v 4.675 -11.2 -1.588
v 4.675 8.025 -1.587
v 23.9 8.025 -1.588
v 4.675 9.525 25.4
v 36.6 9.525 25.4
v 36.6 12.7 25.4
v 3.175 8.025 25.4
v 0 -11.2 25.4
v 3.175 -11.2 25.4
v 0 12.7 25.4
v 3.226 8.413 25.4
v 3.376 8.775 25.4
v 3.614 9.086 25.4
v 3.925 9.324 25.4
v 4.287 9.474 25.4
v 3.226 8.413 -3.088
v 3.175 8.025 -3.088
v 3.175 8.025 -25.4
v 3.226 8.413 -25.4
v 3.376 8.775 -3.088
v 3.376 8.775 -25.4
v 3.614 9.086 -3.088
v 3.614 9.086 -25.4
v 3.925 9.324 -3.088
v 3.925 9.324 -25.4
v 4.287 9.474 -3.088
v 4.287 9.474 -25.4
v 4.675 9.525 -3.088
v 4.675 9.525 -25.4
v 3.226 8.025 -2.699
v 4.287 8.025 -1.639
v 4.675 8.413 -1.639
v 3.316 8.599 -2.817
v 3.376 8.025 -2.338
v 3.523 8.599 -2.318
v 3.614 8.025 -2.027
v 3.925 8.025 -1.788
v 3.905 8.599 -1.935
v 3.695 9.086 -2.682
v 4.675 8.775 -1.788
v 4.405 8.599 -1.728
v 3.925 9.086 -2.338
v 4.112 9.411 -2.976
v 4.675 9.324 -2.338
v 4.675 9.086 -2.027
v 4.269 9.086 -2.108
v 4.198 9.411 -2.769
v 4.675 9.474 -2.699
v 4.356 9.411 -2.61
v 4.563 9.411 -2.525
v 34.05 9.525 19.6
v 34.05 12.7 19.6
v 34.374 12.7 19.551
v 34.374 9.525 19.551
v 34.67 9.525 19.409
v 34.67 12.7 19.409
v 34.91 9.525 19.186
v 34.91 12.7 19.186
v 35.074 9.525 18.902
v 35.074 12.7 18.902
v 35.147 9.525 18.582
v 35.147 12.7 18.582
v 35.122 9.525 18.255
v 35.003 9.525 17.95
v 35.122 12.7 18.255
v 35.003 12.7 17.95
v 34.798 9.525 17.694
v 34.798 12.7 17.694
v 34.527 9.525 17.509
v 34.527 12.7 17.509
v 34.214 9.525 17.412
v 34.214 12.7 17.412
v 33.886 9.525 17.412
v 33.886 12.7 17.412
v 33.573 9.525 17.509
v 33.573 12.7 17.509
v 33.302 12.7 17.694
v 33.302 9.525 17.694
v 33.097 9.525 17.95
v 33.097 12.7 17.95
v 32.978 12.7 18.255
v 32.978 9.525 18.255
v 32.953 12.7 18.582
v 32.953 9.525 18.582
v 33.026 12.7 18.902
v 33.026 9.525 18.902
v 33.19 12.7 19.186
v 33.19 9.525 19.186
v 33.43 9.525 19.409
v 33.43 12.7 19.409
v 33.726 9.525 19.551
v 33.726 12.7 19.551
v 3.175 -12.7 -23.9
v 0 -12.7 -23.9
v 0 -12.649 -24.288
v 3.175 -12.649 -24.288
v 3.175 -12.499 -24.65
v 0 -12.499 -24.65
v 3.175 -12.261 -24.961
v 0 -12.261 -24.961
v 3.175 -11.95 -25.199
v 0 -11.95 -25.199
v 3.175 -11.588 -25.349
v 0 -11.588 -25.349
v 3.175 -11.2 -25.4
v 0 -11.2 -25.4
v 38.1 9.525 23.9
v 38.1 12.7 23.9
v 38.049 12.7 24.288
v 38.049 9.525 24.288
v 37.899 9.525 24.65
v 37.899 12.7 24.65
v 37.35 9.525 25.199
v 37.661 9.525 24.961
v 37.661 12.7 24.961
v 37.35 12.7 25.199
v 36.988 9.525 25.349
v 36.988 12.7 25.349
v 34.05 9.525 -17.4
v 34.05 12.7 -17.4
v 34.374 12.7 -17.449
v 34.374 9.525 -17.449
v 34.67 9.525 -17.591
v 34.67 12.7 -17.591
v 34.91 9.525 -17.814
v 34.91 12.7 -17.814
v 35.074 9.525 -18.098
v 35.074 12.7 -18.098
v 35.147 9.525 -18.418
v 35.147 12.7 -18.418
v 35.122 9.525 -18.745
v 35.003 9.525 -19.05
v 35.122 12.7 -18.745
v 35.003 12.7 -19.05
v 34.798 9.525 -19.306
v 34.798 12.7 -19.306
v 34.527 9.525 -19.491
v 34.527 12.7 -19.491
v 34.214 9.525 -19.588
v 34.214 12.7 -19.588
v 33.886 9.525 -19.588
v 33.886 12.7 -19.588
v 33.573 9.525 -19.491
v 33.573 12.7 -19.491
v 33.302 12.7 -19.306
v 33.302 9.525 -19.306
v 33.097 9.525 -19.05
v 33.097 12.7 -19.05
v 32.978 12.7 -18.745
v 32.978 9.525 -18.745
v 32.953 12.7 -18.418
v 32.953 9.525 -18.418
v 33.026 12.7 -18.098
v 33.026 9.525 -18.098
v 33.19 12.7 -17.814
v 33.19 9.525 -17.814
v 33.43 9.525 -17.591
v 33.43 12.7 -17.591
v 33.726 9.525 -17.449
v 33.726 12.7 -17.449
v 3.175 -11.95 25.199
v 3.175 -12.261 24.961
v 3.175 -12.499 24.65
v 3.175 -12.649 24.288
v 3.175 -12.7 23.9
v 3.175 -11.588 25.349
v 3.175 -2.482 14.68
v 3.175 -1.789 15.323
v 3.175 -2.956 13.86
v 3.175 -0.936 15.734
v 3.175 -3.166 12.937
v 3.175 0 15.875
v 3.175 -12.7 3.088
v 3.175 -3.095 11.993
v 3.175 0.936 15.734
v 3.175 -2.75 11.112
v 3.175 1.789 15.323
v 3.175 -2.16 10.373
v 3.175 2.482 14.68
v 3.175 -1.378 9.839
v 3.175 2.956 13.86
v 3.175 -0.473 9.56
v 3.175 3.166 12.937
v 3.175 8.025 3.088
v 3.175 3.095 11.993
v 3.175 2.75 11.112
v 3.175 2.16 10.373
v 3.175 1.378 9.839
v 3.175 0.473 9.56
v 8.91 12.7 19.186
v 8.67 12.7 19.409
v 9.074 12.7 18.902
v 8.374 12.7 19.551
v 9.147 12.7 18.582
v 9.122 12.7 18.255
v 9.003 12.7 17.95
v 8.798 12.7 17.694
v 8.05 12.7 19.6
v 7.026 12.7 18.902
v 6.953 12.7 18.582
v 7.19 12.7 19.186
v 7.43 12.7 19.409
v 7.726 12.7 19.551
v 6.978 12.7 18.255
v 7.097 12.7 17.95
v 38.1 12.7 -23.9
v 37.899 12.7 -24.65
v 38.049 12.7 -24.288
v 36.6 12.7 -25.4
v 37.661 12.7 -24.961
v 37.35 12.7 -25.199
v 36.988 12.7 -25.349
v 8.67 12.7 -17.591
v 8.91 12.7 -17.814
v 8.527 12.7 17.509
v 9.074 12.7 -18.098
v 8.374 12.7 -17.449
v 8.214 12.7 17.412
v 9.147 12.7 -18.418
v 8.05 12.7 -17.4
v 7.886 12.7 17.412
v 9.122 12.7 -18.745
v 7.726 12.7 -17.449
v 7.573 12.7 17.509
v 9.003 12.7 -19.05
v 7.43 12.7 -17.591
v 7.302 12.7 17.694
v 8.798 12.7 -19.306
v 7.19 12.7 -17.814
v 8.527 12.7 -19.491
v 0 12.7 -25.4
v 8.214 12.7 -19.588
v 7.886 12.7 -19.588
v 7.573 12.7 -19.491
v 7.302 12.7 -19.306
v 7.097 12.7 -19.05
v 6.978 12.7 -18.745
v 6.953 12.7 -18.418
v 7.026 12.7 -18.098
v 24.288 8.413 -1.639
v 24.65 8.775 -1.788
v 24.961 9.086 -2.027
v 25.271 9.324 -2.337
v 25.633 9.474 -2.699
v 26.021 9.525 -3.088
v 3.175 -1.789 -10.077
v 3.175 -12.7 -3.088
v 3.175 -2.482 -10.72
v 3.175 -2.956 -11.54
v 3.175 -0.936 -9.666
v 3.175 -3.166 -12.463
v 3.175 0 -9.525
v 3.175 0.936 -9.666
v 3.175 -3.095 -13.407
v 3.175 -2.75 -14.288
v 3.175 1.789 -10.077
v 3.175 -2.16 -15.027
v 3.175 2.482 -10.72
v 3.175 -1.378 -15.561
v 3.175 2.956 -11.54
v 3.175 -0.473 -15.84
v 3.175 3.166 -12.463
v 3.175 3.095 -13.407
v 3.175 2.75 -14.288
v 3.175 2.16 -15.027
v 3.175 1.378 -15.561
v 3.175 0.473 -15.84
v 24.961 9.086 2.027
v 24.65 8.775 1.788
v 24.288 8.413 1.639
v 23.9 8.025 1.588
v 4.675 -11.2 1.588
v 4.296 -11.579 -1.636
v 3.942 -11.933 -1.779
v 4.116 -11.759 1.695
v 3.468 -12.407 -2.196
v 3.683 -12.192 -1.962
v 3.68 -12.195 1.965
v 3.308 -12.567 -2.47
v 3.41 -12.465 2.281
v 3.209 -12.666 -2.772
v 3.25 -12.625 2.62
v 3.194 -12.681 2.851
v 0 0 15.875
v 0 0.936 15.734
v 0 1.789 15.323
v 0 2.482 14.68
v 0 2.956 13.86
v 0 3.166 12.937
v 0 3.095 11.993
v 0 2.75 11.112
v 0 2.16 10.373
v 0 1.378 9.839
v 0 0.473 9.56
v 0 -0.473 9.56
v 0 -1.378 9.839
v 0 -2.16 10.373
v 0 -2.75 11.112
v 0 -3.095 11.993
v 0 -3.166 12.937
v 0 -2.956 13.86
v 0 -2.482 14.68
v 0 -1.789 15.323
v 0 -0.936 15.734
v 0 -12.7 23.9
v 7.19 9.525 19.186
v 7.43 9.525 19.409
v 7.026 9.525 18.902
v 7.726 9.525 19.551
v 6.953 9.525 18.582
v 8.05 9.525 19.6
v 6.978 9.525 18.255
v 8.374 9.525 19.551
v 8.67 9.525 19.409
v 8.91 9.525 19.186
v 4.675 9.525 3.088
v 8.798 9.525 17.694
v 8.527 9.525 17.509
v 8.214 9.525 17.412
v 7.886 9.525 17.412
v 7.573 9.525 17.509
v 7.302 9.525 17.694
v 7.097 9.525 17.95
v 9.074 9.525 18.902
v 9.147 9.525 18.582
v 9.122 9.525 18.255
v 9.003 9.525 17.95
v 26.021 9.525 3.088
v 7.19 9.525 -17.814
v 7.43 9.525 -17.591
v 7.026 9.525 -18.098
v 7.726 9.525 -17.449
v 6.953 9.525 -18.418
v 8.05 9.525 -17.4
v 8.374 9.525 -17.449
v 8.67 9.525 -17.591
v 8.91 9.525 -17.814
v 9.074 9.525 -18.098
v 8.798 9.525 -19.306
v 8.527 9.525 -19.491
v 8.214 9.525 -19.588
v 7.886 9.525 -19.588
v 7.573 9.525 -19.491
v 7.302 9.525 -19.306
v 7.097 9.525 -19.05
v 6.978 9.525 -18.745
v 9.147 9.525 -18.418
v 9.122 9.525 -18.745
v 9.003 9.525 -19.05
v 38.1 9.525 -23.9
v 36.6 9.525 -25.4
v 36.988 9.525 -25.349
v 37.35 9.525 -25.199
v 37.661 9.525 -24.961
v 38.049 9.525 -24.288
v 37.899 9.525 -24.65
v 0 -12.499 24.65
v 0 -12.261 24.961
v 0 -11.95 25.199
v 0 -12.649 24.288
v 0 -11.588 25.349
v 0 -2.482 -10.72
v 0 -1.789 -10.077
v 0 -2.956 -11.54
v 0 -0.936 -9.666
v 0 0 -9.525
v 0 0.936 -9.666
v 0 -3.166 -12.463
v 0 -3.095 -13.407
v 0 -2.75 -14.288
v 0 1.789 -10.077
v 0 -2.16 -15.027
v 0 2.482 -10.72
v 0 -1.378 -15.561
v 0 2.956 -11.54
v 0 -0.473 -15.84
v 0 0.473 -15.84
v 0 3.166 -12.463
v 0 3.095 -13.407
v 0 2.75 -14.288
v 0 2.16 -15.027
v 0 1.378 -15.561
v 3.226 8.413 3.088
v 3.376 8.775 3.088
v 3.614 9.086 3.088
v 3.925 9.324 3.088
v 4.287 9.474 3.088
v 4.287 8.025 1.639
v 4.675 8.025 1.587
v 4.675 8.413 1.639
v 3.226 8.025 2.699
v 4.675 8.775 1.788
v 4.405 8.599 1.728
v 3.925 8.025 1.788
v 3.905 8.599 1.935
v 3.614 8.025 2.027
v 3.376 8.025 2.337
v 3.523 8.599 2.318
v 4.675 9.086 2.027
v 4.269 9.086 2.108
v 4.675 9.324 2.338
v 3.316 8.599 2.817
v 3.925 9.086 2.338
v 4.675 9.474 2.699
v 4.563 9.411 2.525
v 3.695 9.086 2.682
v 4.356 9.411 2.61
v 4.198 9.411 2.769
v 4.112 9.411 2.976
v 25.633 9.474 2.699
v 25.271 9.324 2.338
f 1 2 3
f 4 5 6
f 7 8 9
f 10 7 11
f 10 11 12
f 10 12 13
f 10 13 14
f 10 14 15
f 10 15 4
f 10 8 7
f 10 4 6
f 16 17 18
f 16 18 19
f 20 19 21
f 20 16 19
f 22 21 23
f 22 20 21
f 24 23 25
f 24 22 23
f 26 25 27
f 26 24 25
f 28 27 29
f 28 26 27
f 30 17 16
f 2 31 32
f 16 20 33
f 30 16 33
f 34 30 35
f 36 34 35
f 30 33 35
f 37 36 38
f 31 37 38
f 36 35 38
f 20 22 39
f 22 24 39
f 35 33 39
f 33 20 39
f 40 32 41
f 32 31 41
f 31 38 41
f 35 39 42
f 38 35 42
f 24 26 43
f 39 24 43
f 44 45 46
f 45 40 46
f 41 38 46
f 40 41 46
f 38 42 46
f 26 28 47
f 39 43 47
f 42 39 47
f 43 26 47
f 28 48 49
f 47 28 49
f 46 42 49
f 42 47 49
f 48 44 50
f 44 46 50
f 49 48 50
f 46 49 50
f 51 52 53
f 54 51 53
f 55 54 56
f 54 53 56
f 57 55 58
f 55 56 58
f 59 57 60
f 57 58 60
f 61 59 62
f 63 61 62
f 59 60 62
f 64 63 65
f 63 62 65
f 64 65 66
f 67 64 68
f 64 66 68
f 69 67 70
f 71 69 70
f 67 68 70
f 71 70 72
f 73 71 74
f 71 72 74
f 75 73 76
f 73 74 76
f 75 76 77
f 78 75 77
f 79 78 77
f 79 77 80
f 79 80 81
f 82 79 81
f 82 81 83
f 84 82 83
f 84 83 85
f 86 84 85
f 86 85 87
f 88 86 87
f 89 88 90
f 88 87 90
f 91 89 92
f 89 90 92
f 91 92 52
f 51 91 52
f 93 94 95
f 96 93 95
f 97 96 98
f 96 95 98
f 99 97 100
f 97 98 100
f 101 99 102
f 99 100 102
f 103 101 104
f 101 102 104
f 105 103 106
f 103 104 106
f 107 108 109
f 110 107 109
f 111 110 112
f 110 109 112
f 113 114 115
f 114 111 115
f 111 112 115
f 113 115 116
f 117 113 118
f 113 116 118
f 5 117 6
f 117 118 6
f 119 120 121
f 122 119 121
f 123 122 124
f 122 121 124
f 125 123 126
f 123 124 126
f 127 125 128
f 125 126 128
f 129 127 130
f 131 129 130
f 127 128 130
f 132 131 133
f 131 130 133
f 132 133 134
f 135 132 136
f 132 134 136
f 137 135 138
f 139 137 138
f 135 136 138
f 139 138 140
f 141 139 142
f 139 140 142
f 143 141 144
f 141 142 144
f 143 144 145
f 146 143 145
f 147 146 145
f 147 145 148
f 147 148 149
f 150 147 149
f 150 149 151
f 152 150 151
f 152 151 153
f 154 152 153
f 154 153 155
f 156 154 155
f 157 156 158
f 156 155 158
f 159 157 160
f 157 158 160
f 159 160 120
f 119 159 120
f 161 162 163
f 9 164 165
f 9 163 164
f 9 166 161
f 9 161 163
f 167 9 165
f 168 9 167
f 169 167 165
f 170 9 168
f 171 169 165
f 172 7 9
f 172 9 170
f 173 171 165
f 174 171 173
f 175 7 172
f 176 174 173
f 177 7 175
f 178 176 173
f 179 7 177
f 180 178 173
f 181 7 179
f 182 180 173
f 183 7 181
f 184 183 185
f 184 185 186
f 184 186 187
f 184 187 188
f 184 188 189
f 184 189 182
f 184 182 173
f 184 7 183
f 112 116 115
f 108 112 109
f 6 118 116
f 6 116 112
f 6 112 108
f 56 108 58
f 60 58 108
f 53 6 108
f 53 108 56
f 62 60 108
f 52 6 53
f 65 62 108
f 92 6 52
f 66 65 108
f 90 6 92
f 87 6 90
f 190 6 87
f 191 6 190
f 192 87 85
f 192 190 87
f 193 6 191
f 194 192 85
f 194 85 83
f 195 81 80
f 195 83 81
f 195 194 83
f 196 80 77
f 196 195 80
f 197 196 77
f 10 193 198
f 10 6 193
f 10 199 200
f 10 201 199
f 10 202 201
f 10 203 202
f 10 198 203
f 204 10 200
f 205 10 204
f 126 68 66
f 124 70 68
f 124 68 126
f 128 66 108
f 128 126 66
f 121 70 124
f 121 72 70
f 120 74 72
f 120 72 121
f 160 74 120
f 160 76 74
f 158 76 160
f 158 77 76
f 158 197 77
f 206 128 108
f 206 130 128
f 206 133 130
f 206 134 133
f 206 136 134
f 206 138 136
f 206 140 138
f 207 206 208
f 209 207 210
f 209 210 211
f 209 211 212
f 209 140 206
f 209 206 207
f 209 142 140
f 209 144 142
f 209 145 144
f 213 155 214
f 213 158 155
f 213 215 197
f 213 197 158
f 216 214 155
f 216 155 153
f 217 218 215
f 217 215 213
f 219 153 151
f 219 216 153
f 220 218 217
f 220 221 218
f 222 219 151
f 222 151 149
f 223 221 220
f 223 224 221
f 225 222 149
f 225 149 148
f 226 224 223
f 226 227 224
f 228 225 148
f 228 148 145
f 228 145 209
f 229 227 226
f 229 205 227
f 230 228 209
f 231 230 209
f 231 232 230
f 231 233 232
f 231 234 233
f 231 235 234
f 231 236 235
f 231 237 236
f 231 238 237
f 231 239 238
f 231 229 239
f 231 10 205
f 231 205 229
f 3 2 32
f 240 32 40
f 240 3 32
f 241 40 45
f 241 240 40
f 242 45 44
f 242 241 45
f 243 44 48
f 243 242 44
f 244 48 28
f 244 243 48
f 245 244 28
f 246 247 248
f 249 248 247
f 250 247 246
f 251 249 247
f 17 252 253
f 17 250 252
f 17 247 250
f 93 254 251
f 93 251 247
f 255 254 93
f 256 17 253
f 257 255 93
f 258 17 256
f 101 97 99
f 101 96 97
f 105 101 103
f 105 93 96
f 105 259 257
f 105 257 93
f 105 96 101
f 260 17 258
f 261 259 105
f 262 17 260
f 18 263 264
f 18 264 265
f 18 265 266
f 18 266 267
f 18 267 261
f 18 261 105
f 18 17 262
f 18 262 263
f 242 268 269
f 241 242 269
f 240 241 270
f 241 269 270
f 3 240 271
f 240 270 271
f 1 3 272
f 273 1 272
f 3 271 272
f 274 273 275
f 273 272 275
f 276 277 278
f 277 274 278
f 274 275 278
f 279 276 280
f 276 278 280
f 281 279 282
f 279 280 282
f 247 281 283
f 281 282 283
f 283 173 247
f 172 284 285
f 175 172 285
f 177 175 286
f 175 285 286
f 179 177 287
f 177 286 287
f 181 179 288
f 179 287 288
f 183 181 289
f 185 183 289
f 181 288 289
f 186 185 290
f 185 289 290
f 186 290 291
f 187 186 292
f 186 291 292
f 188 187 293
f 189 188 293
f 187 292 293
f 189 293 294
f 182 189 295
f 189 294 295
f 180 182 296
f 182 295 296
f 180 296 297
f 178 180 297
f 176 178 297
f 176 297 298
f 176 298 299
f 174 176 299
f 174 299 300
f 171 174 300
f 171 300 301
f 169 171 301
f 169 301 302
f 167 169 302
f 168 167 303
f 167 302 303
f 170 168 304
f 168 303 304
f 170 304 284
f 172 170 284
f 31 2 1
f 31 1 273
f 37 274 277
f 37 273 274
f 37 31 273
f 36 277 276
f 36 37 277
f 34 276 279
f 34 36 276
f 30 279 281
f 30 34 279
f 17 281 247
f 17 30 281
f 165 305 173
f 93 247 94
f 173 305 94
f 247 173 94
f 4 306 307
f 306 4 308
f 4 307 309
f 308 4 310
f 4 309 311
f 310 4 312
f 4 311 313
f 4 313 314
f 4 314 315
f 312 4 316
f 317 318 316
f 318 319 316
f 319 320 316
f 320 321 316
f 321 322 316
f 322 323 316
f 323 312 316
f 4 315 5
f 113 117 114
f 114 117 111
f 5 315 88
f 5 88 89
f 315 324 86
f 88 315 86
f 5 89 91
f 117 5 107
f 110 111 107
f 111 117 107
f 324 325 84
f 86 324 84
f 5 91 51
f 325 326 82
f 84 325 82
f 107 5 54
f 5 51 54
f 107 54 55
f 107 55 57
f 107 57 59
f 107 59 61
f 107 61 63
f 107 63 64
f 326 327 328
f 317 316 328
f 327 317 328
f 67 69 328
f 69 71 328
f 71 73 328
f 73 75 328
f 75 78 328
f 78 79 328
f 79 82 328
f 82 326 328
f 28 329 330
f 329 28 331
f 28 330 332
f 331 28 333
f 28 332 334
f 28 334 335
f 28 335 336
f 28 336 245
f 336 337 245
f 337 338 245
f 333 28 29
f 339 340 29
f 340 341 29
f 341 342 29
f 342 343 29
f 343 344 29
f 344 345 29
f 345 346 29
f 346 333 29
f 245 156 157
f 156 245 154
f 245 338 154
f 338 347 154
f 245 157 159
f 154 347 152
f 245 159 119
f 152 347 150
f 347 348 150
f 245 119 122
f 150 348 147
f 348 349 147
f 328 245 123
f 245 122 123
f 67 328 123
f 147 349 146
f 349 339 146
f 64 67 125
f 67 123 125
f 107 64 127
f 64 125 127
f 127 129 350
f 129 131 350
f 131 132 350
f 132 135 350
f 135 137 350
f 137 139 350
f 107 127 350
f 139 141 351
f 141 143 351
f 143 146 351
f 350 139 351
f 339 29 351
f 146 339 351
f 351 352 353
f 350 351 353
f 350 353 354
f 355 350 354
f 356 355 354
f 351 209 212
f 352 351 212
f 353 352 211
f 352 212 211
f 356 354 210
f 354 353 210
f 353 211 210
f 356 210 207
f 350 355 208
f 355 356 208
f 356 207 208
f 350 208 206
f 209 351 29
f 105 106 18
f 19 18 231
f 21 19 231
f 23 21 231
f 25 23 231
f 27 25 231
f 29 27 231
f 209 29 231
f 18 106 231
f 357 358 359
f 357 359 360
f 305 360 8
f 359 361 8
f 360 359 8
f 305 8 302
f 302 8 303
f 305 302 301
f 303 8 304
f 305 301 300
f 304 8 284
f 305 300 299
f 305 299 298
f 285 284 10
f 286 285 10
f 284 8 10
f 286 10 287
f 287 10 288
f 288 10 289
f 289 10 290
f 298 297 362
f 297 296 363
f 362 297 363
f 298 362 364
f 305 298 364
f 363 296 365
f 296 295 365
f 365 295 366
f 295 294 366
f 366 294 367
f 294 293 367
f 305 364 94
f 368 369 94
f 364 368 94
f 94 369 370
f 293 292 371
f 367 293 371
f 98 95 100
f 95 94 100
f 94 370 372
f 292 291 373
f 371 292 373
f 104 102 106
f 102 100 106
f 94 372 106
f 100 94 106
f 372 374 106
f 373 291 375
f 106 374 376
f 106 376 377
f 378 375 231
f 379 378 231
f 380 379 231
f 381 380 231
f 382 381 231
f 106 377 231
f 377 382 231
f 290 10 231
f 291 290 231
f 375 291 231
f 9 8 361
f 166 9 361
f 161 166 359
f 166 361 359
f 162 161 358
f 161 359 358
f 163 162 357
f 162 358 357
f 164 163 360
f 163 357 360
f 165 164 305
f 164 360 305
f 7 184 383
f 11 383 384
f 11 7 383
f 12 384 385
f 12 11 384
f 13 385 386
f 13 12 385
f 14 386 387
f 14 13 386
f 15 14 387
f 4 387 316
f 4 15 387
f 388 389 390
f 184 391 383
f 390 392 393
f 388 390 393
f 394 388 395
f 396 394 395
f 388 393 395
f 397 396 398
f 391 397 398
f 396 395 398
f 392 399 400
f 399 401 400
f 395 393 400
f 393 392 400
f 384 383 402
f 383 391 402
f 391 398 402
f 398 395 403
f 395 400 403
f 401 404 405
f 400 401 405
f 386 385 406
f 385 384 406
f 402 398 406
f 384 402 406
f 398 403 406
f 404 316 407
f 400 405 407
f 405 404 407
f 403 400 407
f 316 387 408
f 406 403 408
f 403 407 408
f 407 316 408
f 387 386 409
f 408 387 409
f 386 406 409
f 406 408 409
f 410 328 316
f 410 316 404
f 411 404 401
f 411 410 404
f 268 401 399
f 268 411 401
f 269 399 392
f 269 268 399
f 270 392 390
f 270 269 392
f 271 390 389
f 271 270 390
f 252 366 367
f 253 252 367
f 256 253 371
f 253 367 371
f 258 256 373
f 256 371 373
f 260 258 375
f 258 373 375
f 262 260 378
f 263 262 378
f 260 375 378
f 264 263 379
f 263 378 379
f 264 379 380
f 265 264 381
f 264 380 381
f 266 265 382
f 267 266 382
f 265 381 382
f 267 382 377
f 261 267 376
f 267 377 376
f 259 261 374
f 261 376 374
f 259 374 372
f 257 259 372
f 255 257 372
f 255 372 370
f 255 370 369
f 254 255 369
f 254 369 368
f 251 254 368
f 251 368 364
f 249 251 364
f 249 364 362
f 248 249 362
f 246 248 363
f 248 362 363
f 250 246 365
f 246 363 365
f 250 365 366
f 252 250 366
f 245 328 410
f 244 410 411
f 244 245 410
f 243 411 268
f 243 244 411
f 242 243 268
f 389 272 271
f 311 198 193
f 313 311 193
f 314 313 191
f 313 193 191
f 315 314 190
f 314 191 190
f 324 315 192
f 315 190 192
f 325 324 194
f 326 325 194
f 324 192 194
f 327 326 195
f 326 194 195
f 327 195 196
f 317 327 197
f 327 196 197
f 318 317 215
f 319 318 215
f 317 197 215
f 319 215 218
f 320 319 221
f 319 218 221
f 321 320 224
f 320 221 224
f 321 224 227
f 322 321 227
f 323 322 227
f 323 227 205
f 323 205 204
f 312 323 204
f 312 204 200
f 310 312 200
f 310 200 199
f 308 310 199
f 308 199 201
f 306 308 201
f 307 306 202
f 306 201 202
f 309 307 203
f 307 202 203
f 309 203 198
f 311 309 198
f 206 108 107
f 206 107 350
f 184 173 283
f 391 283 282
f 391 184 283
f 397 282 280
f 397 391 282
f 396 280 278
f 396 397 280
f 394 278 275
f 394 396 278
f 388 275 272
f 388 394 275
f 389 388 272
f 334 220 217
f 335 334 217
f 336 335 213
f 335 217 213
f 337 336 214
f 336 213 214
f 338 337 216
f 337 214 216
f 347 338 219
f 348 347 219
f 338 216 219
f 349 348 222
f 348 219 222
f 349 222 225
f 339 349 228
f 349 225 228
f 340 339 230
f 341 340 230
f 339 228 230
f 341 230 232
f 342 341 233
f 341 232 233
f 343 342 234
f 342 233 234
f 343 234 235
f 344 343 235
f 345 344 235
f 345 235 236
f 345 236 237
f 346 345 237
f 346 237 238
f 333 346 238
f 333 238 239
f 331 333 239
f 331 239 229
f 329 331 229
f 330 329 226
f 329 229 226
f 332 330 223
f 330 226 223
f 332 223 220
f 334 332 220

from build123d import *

# Parameters (mm, degrees)
SKETCH2_W           = 50.8
SKETCH2_H           = 25.4
BOSS_EXTRUDE1_DEPTH = 3.175
SKETCH4_W           = 38.1
SKETCH4_H           = 50.8
BOSS_EXTRUDE2_DEPTH = 3.175
SKETCH5_R           = 1.1
CUT_EXTRUDE1_DEPTH  = 3.175
SKETCH6_R           = 3.175
CUT_EXTRUDE2_DEPTH  = 3.175
BOSS_EXTRUDE3_DEPTH = 1.5875
FILLET3_R           = 1.5


with BuildPart() as part:
    # Sketch2 → Boss-Extrude1 (new body)
    with BuildSketch(Plane(origin=(0, 0, 0), x_dir=(0, 0, -1), z_dir=(1, 0, 0))):
        Rectangle(SKETCH2_W, SKETCH2_H)
    extrude(amount=BOSS_EXTRUDE1_DEPTH)

    # Sketch4 → Boss-Extrude2 (add)
    with BuildSketch(Plane(origin=(0, 12.7, 0), x_dir=(1, 0, 0), z_dir=(0, 1, 0))):
        with Locations((19.05, 0)):
            Rectangle(SKETCH4_W, SKETCH4_H)
    extrude(amount=-BOSS_EXTRUDE2_DEPTH)

    # Sketch5 → Cut-Extrude1 (cut)
    with BuildSketch(Plane(origin=(0, 12.7, 0), x_dir=(1, 0, 0), z_dir=(0, 1, 0))):
        with Locations(Location((8.05, 18.5, 0), (0, 0, 270))):
            Circle(SKETCH5_R)
        with Locations(Location((34.05, 18.5, 0), (0, 0, 270))):
            Circle(SKETCH5_R)
        with Locations(Location((34.05, -18.5, 0), (0, 0, 270))):
            Circle(SKETCH5_R)
        with Locations(Location((8.05, -18.5, 0), (0, 0, 270))):
            Circle(SKETCH5_R)
    extrude(amount=-CUT_EXTRUDE1_DEPTH, mode=Mode.SUBTRACT)

    # Sketch6 → Cut-Extrude2 (cut)
    with BuildSketch(Plane.ZY):
        with Locations((-12.7, 0)):
            Circle(SKETCH6_R)
        with Locations((12.7, 0)):
            Circle(SKETCH6_R)
    extrude(amount=-CUT_EXTRUDE2_DEPTH, mode=Mode.SUBTRACT)

    # Sketch7 → Boss-Extrude3 (add, symmetric)
    with BuildSketch(Plane.XY):
        Polygon((3.175, -12.7), (25.4, 9.525), (3.175, 9.525), align=None)
    extrude(amount=BOSS_EXTRUDE3_DEPTH, both=True)

    # Fillet3
    # the kernel refuses this fillet: 1.5 mm, written as the material it adds along each edge
    with BuildSketch(Plane(origin=(4.675, 8.025, 3.0875), x_dir=(-1, 0, 0), z_dir=(0, 1, 0))) as fillet3_piece_1_section:
        Polygon((0, 0), (FILLET3_R, 0), (FILLET3_R, -FILLET3_R), (0, -FILLET3_R), align=None)
    fillet3_piece_1 = extrude(amount=FILLET3_R, mode=Mode.PRIVATE)
    fillet3_piece_1 = fillet3_piece_1 - Plane(origin=(4.675, 8.025, 3.0875), x_dir=(0.7071067811865475, 0, 0.7071067811865475), z_dir=(0, 1, 0)) * Sphere(FILLET3_R, mode=Mode.PRIVATE)
    add(fillet3_piece_1)
    with BuildSketch(Plane(origin=(4.675, 8.025, -3.0875), x_dir=(0, 0, 1), z_dir=(0, 1, 0))) as fillet3_piece_2_section:
        Polygon((0, 0), (FILLET3_R, 0), (FILLET3_R, -FILLET3_R), (0, -FILLET3_R), align=None)
    fillet3_piece_2 = extrude(amount=FILLET3_R, mode=Mode.PRIVATE)
    fillet3_piece_2 = fillet3_piece_2 - Plane(origin=(4.675, 8.025, -3.0875), x_dir=(0.7071067811865475, 0, -0.7071067811865475), z_dir=(0, 1, 0)) * Sphere(FILLET3_R, mode=Mode.PRIVATE)
    add(fillet3_piece_2)
    with BuildSketch(Plane(origin=(3.175, 9.525, 25.4), x_dir=(0, -1, 0), z_dir=(0, 0, -1)), Plane(origin=(3.175, 9.525, -3.0875), x_dir=(0, -1, 0), z_dir=(0, 0, -1))) as fillet3_piece_3:
        with BuildLine():
            CenterArc((FILLET3_R, -FILLET3_R), FILLET3_R, 90, 90)
            Line((0, -FILLET3_R), (0, 0))
            Line((0, 0), (FILLET3_R, 0))
        make_face()
    extrude(amount=22.3125)
    with BuildSketch(Plane(origin=(29.15, 9.525, -1.5875), x_dir=(0, 0, -1), z_dir=(-1, 0, 0))) as fillet3_piece_4_section:
        with BuildLine():
            CenterArc((FILLET3_R, FILLET3_R), FILLET3_R, 180, 90)
            Line((0, FILLET3_R), (0, 0))
            Line((0, 0), (FILLET3_R, 0))
        make_face()
    fillet3_piece_4 = extrude(amount=24.475, mode=Mode.PRIVATE)
    fillet3_piece_4 = split(fillet3_piece_4, bisect_by=Plane(origin=(19.967902823, 4.092902823, -1.930123153), z_dir=(-0.707106781186549, 0.707106781186546, 0)), keep=Keep.TOP, mode=Mode.PRIVATE)
    add(fillet3_piece_4)
    with BuildSketch(Plane(origin=(25.4, 9.525, -1.5875), x_dir=(-0.7071067811865489, -0.7071067811865461, 0), z_dir=(0, 0, 1))) as fillet3_piece_5:
        with BuildLine():
            CenterArc((FILLET3_R * 0.414213562373, FILLET3_R), FILLET3_R, 225, 45)
            Line((-FILLET3_R * 0.292893218813, FILLET3_R * 0.292893218813), (0, 0))
            Line((0, 0), (FILLET3_R * 0.414213562373, 0))
        make_face()
    extrude(amount=3.175)
    with BuildSketch(Plane(origin=(3.175, 8.025, -1.5875), x_dir=(0, 0, -1), z_dir=(0, -1, 0))) as fillet3_piece_6_section:
        with BuildLine():
            CenterArc((FILLET3_R, FILLET3_R), FILLET3_R, 180, 90)
            Line((0, FILLET3_R), (0, 0))
            Line((0, 0), (FILLET3_R, 0))
        make_face()
    fillet3_piece_6 = extrude(amount=20.725, mode=Mode.PRIVATE)
    fillet3_piece_6 = split(fillet3_piece_6, bisect_by=Plane(origin=(8.60741784, -7.26758216, -1.930100054), z_dir=(-0.707106781186549, 0.707106781186546, 0)), keep=Keep.TOP, mode=Mode.PRIVATE)
    add(fillet3_piece_6)
    with BuildSketch(Plane(origin=(29.15, 9.525, 1.5875), x_dir=(0, 0, 1), z_dir=(-1, 0, 0))) as fillet3_piece_7_section:
        with BuildLine():
            CenterArc((FILLET3_R, -FILLET3_R), FILLET3_R, 90, 90)
            Line((0, -FILLET3_R), (0, 0))
            Line((0, 0), (FILLET3_R, 0))
        make_face()
    fillet3_piece_7 = extrude(amount=24.475, mode=Mode.PRIVATE)
    fillet3_piece_7 = split(fillet3_piece_7, bisect_by=Plane(origin=(19.967902823, 4.092902823, 1.930123153), z_dir=(-0.707106781186549, 0.707106781186546, 0)), keep=Keep.TOP, mode=Mode.PRIVATE)
    add(fillet3_piece_7)
    with BuildSketch(Plane(origin=(3.175, 8.025, 1.5875), x_dir=(0, 0, 1), z_dir=(0, -1, 0))) as fillet3_piece_8_section:
        with BuildLine():
            CenterArc((FILLET3_R, -FILLET3_R), FILLET3_R, 90, 90)
            Line((0, -FILLET3_R), (0, 0))
            Line((0, 0), (FILLET3_R, 0))
        make_face()
    fillet3_piece_8 = extrude(amount=20.725, mode=Mode.PRIVATE)
    fillet3_piece_8 = split(fillet3_piece_8, bisect_by=Plane(origin=(8.60741784, -7.26758216, 1.930100054), z_dir=(-0.707106781186549, 0.707106781186546, 0)), keep=Keep.TOP, mode=Mode.PRIVATE)
    add(fillet3_piece_8)
    with BuildSketch(Plane(origin=(25.4, 9.525, -3.140800859), x_dir=(-0.7071067811865446, -0.7071067811865503, 0), z_dir=(0, 0, 1))) as fillet3_piece_9a_section:
        with BuildLine():
            CenterArc((FILLET3_R * 0.414213562373, FILLET3_R), FILLET3_R, 225, 45)
            Line((-FILLET3_R * 0.292893218813, FILLET3_R * 0.292893218813), (0, 0))
            Line((0, 0), (FILLET3_R * 0.414213562373, 0))
        make_face()
    fillet3_piece_9a = extrude(amount=4.728300859, mode=Mode.PRIVATE)
    fillet3_piece_9a = split(fillet3_piece_9a, bisect_by=Plane(origin=(25.438403899, 9.432284787, -1.5875), z_dir=(0, 0, -1)), keep=Keep.TOP, mode=Mode.PRIVATE)
    with BuildSketch(Plane(origin=(29.15, 9.525, -1.5875), x_dir=(0, 0, -1), z_dir=(-1, 0, 0))) as fillet3_piece_9b_section:
        with BuildLine():
            CenterArc((FILLET3_R, FILLET3_R), FILLET3_R, 180, 90)
            Line((0, FILLET3_R), (0, 0))
            Line((0, 0), (FILLET3_R, 0))
        make_face()
    fillet3_piece_9b = extrude(amount=24.475, mode=Mode.PRIVATE)
    fillet3_piece_9b = split(fillet3_piece_9b, bisect_by=Plane(origin=(26.063627713, 10.188627713, -1.91198662), z_dir=(0.707106781186549, -0.707106781186546, 0)), keep=Keep.TOP, mode=Mode.PRIVATE)
    fillet3_piece_9 = fillet3_piece_9a & fillet3_piece_9b
    add(fillet3_piece_9)
    with BuildSketch(Plane(origin=(25.4, 9.525, -1.5875), x_dir=(-0.7071067811865489, -0.7071067811865461, 0), z_dir=(0, 0, 1))) as fillet3_piece_10a_section:
        with BuildLine():
            CenterArc((FILLET3_R * 0.414213562373, FILLET3_R), FILLET3_R, 225, 45)
            Line((-FILLET3_R * 0.292893218813, FILLET3_R * 0.292893218813), (0, 0))
            Line((0, 0), (FILLET3_R * 0.414213562373, 0))
        make_face()
    fillet3_piece_10a = extrude(amount=4.728300859, mode=Mode.PRIVATE)
    fillet3_piece_10a = split(fillet3_piece_10a, bisect_by=Plane(origin=(25.438403899, 9.432284787, 1.5875), z_dir=(0, 0, 1)), keep=Keep.TOP, mode=Mode.PRIVATE)
    with BuildSketch(Plane(origin=(29.15, 9.525, 1.5875), x_dir=(0, 0, 1), z_dir=(-1, 0, 0))) as fillet3_piece_10b_section:
        with BuildLine():
            CenterArc((FILLET3_R, -FILLET3_R), FILLET3_R, 90, 90)
            Line((0, -FILLET3_R), (0, 0))
            Line((0, 0), (FILLET3_R, 0))
        make_face()
    fillet3_piece_10b = extrude(amount=24.475, mode=Mode.PRIVATE)
    fillet3_piece_10b = split(fillet3_piece_10b, bisect_by=Plane(origin=(26.063627713, 10.188627713, 1.91198662), z_dir=(0.707106781186549, -0.707106781186546, 0)), keep=Keep.TOP, mode=Mode.PRIVATE)
    fillet3_piece_10 = fillet3_piece_10a & fillet3_piece_10b
    add(fillet3_piece_10)
    # the kernel refuses this fillet: 1.5 mm, written as the material it takes off along each edge
    with BuildSketch(Plane(origin=(38.1, 16.45, 25.4), x_dir=(0, 0, -1), z_dir=(0, -1, 0)), Plane(origin=(-3.75, -12.7, -25.4), x_dir=(0, 0, 1), z_dir=(1, 0, 0))) as fillet3_2_piece_1:
        with BuildLine():
            CenterArc((FILLET3_R, -FILLET3_R), FILLET3_R, 90, 90)
            Line((0, -FILLET3_R), (0, 0))
            Line((0, 0), (FILLET3_R, 0))
        make_face()
    extrude(amount=10.675, mode=Mode.SUBTRACT)
    with BuildSketch(Plane(origin=(38.1, 16.45, -25.4), x_dir=(0, 0, 1), z_dir=(0, -1, 0)), Plane(origin=(-3.75, -12.7, 25.4), x_dir=(0, 0, -1), z_dir=(1, 0, 0))) as fillet3_2_piece_2:
        with BuildLine():
            CenterArc((FILLET3_R, FILLET3_R), FILLET3_R, 180, 90)
            Line((0, FILLET3_R), (0, 0))
            Line((0, 0), (FILLET3_R, 0))
        make_face()
    extrude(amount=10.675, mode=Mode.SUBTRACT)


solid = part.part
